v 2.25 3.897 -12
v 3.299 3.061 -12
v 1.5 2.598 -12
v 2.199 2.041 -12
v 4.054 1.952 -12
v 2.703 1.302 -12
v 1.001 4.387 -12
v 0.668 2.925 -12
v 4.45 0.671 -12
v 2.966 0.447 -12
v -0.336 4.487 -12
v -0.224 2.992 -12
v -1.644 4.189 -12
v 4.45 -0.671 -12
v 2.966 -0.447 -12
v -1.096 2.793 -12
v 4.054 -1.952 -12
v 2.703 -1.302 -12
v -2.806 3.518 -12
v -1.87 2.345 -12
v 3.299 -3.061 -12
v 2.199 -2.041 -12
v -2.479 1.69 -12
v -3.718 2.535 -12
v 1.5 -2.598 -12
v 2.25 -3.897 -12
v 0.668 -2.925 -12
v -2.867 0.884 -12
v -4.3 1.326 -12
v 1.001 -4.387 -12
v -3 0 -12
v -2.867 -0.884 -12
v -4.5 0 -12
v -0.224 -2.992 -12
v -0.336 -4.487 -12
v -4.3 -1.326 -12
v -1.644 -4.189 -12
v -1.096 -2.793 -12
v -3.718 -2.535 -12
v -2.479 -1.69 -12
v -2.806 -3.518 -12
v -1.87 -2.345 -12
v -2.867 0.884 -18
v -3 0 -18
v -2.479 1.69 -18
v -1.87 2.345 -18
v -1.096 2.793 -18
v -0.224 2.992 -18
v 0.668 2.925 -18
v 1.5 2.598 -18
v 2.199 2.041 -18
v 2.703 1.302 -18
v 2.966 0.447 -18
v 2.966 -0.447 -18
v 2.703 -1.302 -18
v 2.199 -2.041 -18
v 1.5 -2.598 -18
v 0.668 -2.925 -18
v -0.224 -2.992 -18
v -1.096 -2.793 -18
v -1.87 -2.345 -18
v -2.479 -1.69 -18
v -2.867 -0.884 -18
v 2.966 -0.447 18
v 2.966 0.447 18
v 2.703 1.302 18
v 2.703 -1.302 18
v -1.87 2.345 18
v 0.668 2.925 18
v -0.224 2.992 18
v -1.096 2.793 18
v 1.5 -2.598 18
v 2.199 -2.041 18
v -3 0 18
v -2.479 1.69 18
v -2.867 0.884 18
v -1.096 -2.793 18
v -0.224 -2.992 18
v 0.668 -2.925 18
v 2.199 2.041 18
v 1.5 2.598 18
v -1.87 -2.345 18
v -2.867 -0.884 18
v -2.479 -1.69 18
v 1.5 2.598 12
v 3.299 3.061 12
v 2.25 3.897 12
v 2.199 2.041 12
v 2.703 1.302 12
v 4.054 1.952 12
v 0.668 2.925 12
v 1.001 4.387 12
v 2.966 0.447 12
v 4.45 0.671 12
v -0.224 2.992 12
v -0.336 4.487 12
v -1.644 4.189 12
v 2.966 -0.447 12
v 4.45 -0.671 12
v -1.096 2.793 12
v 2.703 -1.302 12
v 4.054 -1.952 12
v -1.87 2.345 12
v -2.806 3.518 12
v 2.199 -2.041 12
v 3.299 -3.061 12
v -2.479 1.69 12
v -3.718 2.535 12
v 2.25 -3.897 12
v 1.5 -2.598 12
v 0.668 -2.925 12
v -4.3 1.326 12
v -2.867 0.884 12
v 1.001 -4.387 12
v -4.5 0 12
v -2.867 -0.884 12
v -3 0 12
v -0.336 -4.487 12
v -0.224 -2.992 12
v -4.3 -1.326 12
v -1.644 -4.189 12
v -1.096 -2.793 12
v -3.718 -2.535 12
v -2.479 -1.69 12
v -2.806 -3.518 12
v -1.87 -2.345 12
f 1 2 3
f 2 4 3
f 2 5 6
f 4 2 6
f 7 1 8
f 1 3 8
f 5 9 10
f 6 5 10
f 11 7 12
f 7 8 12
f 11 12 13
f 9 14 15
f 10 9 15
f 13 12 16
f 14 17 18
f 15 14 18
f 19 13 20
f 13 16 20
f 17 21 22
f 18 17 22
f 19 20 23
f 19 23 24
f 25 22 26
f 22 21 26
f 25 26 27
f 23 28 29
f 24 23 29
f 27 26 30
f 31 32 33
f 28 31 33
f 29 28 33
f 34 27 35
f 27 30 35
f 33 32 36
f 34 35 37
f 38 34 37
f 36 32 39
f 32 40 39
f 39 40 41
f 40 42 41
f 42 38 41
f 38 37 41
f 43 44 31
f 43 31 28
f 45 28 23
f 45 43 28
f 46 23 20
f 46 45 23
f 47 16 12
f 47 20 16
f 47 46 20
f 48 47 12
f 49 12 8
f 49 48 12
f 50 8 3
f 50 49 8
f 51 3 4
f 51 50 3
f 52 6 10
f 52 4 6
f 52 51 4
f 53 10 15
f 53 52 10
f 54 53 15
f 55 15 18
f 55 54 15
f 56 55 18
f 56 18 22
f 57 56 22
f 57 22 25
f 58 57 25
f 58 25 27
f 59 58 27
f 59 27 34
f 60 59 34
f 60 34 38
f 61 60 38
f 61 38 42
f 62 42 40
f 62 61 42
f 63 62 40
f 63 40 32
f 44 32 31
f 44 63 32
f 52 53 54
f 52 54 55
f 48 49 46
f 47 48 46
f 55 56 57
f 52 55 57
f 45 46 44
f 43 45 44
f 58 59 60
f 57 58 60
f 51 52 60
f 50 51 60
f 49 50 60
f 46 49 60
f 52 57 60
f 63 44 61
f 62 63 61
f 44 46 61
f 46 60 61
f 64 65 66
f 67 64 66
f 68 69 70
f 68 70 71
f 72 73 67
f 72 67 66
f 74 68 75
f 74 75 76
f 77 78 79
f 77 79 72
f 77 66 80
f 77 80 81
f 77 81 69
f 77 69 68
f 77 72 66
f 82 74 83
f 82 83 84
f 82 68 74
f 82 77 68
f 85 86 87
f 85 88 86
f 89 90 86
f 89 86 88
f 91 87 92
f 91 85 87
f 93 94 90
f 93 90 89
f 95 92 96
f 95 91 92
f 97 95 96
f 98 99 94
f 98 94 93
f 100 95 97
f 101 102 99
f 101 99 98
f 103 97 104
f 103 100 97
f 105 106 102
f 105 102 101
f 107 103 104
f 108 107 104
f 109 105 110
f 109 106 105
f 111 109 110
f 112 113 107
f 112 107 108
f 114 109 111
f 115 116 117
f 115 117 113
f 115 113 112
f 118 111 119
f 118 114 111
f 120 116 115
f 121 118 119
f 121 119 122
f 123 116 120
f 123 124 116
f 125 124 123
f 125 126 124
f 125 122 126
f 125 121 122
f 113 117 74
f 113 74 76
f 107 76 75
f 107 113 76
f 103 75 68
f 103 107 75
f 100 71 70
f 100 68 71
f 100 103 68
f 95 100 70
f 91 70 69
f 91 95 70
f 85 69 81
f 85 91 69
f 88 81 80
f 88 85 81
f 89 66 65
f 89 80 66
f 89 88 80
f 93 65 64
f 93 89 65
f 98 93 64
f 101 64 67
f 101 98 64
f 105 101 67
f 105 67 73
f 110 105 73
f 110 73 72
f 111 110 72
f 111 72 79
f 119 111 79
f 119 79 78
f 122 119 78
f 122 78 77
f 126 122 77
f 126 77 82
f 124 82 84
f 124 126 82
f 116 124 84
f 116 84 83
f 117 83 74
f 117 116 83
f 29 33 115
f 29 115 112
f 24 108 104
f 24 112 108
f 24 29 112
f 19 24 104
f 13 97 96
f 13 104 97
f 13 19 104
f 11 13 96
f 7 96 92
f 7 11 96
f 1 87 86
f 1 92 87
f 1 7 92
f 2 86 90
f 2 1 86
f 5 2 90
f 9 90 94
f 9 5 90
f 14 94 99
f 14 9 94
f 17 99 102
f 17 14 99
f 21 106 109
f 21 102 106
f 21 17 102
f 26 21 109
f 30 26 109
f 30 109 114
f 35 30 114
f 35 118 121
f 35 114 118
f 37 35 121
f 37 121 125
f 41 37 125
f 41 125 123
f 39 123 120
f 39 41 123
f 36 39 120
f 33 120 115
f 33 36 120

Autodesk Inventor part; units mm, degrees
ref_plane "YZ Plane" through (0, 0, 0) normal (1, 0, 0) x (0, 1, 0)
ref_plane "XZ Plane" through (0, 0, 0) normal (0, 1, 0) x (-1, 0, 0)
ref_plane "XY Plane" through (0, 0, 0) normal (0, 0, 1) x (1, 0, 0)
sketch "Skizze1" plane through (0, 0, 0) normal (0, 1, 0) x (-1, 0, 0)
  line L0 (0, 18) -> (3, 18)
  line L1 (3, 18) -> (3, 12)
  line L2 (3, 12) -> (4.5, 12)
  line L3 (4.5, 12) -> (4.5, -12)
  line L4 (4.5, -12) -> (3, -12)
  line L5 (3, -12) -> (3, -18)
  line L6 (3, -18) -> (0, -18)
  line L7 (0, -18) -> (0, 18)
  point P0 (0, 0)
  point P1 (0, 0)
  dimension "d0" = 6
  dimension "d1" = 6
  dimension "d2" = 24
  dimension "d3" = 9
  dimension "d4" = 6
revolve "Umdrehung1" add sketch "Skizze1" angle 360 about axis through (0, 0, -18) along (0, 0, 1)
thread "Gewinde1" size "M6x1" class "6g" standard "ISO Metric profile" length 18
thread "Gewinde2" size "M6x1" class "6g" standard "ISO Metric profile" length 18
properties part number "welle_verbindung"
